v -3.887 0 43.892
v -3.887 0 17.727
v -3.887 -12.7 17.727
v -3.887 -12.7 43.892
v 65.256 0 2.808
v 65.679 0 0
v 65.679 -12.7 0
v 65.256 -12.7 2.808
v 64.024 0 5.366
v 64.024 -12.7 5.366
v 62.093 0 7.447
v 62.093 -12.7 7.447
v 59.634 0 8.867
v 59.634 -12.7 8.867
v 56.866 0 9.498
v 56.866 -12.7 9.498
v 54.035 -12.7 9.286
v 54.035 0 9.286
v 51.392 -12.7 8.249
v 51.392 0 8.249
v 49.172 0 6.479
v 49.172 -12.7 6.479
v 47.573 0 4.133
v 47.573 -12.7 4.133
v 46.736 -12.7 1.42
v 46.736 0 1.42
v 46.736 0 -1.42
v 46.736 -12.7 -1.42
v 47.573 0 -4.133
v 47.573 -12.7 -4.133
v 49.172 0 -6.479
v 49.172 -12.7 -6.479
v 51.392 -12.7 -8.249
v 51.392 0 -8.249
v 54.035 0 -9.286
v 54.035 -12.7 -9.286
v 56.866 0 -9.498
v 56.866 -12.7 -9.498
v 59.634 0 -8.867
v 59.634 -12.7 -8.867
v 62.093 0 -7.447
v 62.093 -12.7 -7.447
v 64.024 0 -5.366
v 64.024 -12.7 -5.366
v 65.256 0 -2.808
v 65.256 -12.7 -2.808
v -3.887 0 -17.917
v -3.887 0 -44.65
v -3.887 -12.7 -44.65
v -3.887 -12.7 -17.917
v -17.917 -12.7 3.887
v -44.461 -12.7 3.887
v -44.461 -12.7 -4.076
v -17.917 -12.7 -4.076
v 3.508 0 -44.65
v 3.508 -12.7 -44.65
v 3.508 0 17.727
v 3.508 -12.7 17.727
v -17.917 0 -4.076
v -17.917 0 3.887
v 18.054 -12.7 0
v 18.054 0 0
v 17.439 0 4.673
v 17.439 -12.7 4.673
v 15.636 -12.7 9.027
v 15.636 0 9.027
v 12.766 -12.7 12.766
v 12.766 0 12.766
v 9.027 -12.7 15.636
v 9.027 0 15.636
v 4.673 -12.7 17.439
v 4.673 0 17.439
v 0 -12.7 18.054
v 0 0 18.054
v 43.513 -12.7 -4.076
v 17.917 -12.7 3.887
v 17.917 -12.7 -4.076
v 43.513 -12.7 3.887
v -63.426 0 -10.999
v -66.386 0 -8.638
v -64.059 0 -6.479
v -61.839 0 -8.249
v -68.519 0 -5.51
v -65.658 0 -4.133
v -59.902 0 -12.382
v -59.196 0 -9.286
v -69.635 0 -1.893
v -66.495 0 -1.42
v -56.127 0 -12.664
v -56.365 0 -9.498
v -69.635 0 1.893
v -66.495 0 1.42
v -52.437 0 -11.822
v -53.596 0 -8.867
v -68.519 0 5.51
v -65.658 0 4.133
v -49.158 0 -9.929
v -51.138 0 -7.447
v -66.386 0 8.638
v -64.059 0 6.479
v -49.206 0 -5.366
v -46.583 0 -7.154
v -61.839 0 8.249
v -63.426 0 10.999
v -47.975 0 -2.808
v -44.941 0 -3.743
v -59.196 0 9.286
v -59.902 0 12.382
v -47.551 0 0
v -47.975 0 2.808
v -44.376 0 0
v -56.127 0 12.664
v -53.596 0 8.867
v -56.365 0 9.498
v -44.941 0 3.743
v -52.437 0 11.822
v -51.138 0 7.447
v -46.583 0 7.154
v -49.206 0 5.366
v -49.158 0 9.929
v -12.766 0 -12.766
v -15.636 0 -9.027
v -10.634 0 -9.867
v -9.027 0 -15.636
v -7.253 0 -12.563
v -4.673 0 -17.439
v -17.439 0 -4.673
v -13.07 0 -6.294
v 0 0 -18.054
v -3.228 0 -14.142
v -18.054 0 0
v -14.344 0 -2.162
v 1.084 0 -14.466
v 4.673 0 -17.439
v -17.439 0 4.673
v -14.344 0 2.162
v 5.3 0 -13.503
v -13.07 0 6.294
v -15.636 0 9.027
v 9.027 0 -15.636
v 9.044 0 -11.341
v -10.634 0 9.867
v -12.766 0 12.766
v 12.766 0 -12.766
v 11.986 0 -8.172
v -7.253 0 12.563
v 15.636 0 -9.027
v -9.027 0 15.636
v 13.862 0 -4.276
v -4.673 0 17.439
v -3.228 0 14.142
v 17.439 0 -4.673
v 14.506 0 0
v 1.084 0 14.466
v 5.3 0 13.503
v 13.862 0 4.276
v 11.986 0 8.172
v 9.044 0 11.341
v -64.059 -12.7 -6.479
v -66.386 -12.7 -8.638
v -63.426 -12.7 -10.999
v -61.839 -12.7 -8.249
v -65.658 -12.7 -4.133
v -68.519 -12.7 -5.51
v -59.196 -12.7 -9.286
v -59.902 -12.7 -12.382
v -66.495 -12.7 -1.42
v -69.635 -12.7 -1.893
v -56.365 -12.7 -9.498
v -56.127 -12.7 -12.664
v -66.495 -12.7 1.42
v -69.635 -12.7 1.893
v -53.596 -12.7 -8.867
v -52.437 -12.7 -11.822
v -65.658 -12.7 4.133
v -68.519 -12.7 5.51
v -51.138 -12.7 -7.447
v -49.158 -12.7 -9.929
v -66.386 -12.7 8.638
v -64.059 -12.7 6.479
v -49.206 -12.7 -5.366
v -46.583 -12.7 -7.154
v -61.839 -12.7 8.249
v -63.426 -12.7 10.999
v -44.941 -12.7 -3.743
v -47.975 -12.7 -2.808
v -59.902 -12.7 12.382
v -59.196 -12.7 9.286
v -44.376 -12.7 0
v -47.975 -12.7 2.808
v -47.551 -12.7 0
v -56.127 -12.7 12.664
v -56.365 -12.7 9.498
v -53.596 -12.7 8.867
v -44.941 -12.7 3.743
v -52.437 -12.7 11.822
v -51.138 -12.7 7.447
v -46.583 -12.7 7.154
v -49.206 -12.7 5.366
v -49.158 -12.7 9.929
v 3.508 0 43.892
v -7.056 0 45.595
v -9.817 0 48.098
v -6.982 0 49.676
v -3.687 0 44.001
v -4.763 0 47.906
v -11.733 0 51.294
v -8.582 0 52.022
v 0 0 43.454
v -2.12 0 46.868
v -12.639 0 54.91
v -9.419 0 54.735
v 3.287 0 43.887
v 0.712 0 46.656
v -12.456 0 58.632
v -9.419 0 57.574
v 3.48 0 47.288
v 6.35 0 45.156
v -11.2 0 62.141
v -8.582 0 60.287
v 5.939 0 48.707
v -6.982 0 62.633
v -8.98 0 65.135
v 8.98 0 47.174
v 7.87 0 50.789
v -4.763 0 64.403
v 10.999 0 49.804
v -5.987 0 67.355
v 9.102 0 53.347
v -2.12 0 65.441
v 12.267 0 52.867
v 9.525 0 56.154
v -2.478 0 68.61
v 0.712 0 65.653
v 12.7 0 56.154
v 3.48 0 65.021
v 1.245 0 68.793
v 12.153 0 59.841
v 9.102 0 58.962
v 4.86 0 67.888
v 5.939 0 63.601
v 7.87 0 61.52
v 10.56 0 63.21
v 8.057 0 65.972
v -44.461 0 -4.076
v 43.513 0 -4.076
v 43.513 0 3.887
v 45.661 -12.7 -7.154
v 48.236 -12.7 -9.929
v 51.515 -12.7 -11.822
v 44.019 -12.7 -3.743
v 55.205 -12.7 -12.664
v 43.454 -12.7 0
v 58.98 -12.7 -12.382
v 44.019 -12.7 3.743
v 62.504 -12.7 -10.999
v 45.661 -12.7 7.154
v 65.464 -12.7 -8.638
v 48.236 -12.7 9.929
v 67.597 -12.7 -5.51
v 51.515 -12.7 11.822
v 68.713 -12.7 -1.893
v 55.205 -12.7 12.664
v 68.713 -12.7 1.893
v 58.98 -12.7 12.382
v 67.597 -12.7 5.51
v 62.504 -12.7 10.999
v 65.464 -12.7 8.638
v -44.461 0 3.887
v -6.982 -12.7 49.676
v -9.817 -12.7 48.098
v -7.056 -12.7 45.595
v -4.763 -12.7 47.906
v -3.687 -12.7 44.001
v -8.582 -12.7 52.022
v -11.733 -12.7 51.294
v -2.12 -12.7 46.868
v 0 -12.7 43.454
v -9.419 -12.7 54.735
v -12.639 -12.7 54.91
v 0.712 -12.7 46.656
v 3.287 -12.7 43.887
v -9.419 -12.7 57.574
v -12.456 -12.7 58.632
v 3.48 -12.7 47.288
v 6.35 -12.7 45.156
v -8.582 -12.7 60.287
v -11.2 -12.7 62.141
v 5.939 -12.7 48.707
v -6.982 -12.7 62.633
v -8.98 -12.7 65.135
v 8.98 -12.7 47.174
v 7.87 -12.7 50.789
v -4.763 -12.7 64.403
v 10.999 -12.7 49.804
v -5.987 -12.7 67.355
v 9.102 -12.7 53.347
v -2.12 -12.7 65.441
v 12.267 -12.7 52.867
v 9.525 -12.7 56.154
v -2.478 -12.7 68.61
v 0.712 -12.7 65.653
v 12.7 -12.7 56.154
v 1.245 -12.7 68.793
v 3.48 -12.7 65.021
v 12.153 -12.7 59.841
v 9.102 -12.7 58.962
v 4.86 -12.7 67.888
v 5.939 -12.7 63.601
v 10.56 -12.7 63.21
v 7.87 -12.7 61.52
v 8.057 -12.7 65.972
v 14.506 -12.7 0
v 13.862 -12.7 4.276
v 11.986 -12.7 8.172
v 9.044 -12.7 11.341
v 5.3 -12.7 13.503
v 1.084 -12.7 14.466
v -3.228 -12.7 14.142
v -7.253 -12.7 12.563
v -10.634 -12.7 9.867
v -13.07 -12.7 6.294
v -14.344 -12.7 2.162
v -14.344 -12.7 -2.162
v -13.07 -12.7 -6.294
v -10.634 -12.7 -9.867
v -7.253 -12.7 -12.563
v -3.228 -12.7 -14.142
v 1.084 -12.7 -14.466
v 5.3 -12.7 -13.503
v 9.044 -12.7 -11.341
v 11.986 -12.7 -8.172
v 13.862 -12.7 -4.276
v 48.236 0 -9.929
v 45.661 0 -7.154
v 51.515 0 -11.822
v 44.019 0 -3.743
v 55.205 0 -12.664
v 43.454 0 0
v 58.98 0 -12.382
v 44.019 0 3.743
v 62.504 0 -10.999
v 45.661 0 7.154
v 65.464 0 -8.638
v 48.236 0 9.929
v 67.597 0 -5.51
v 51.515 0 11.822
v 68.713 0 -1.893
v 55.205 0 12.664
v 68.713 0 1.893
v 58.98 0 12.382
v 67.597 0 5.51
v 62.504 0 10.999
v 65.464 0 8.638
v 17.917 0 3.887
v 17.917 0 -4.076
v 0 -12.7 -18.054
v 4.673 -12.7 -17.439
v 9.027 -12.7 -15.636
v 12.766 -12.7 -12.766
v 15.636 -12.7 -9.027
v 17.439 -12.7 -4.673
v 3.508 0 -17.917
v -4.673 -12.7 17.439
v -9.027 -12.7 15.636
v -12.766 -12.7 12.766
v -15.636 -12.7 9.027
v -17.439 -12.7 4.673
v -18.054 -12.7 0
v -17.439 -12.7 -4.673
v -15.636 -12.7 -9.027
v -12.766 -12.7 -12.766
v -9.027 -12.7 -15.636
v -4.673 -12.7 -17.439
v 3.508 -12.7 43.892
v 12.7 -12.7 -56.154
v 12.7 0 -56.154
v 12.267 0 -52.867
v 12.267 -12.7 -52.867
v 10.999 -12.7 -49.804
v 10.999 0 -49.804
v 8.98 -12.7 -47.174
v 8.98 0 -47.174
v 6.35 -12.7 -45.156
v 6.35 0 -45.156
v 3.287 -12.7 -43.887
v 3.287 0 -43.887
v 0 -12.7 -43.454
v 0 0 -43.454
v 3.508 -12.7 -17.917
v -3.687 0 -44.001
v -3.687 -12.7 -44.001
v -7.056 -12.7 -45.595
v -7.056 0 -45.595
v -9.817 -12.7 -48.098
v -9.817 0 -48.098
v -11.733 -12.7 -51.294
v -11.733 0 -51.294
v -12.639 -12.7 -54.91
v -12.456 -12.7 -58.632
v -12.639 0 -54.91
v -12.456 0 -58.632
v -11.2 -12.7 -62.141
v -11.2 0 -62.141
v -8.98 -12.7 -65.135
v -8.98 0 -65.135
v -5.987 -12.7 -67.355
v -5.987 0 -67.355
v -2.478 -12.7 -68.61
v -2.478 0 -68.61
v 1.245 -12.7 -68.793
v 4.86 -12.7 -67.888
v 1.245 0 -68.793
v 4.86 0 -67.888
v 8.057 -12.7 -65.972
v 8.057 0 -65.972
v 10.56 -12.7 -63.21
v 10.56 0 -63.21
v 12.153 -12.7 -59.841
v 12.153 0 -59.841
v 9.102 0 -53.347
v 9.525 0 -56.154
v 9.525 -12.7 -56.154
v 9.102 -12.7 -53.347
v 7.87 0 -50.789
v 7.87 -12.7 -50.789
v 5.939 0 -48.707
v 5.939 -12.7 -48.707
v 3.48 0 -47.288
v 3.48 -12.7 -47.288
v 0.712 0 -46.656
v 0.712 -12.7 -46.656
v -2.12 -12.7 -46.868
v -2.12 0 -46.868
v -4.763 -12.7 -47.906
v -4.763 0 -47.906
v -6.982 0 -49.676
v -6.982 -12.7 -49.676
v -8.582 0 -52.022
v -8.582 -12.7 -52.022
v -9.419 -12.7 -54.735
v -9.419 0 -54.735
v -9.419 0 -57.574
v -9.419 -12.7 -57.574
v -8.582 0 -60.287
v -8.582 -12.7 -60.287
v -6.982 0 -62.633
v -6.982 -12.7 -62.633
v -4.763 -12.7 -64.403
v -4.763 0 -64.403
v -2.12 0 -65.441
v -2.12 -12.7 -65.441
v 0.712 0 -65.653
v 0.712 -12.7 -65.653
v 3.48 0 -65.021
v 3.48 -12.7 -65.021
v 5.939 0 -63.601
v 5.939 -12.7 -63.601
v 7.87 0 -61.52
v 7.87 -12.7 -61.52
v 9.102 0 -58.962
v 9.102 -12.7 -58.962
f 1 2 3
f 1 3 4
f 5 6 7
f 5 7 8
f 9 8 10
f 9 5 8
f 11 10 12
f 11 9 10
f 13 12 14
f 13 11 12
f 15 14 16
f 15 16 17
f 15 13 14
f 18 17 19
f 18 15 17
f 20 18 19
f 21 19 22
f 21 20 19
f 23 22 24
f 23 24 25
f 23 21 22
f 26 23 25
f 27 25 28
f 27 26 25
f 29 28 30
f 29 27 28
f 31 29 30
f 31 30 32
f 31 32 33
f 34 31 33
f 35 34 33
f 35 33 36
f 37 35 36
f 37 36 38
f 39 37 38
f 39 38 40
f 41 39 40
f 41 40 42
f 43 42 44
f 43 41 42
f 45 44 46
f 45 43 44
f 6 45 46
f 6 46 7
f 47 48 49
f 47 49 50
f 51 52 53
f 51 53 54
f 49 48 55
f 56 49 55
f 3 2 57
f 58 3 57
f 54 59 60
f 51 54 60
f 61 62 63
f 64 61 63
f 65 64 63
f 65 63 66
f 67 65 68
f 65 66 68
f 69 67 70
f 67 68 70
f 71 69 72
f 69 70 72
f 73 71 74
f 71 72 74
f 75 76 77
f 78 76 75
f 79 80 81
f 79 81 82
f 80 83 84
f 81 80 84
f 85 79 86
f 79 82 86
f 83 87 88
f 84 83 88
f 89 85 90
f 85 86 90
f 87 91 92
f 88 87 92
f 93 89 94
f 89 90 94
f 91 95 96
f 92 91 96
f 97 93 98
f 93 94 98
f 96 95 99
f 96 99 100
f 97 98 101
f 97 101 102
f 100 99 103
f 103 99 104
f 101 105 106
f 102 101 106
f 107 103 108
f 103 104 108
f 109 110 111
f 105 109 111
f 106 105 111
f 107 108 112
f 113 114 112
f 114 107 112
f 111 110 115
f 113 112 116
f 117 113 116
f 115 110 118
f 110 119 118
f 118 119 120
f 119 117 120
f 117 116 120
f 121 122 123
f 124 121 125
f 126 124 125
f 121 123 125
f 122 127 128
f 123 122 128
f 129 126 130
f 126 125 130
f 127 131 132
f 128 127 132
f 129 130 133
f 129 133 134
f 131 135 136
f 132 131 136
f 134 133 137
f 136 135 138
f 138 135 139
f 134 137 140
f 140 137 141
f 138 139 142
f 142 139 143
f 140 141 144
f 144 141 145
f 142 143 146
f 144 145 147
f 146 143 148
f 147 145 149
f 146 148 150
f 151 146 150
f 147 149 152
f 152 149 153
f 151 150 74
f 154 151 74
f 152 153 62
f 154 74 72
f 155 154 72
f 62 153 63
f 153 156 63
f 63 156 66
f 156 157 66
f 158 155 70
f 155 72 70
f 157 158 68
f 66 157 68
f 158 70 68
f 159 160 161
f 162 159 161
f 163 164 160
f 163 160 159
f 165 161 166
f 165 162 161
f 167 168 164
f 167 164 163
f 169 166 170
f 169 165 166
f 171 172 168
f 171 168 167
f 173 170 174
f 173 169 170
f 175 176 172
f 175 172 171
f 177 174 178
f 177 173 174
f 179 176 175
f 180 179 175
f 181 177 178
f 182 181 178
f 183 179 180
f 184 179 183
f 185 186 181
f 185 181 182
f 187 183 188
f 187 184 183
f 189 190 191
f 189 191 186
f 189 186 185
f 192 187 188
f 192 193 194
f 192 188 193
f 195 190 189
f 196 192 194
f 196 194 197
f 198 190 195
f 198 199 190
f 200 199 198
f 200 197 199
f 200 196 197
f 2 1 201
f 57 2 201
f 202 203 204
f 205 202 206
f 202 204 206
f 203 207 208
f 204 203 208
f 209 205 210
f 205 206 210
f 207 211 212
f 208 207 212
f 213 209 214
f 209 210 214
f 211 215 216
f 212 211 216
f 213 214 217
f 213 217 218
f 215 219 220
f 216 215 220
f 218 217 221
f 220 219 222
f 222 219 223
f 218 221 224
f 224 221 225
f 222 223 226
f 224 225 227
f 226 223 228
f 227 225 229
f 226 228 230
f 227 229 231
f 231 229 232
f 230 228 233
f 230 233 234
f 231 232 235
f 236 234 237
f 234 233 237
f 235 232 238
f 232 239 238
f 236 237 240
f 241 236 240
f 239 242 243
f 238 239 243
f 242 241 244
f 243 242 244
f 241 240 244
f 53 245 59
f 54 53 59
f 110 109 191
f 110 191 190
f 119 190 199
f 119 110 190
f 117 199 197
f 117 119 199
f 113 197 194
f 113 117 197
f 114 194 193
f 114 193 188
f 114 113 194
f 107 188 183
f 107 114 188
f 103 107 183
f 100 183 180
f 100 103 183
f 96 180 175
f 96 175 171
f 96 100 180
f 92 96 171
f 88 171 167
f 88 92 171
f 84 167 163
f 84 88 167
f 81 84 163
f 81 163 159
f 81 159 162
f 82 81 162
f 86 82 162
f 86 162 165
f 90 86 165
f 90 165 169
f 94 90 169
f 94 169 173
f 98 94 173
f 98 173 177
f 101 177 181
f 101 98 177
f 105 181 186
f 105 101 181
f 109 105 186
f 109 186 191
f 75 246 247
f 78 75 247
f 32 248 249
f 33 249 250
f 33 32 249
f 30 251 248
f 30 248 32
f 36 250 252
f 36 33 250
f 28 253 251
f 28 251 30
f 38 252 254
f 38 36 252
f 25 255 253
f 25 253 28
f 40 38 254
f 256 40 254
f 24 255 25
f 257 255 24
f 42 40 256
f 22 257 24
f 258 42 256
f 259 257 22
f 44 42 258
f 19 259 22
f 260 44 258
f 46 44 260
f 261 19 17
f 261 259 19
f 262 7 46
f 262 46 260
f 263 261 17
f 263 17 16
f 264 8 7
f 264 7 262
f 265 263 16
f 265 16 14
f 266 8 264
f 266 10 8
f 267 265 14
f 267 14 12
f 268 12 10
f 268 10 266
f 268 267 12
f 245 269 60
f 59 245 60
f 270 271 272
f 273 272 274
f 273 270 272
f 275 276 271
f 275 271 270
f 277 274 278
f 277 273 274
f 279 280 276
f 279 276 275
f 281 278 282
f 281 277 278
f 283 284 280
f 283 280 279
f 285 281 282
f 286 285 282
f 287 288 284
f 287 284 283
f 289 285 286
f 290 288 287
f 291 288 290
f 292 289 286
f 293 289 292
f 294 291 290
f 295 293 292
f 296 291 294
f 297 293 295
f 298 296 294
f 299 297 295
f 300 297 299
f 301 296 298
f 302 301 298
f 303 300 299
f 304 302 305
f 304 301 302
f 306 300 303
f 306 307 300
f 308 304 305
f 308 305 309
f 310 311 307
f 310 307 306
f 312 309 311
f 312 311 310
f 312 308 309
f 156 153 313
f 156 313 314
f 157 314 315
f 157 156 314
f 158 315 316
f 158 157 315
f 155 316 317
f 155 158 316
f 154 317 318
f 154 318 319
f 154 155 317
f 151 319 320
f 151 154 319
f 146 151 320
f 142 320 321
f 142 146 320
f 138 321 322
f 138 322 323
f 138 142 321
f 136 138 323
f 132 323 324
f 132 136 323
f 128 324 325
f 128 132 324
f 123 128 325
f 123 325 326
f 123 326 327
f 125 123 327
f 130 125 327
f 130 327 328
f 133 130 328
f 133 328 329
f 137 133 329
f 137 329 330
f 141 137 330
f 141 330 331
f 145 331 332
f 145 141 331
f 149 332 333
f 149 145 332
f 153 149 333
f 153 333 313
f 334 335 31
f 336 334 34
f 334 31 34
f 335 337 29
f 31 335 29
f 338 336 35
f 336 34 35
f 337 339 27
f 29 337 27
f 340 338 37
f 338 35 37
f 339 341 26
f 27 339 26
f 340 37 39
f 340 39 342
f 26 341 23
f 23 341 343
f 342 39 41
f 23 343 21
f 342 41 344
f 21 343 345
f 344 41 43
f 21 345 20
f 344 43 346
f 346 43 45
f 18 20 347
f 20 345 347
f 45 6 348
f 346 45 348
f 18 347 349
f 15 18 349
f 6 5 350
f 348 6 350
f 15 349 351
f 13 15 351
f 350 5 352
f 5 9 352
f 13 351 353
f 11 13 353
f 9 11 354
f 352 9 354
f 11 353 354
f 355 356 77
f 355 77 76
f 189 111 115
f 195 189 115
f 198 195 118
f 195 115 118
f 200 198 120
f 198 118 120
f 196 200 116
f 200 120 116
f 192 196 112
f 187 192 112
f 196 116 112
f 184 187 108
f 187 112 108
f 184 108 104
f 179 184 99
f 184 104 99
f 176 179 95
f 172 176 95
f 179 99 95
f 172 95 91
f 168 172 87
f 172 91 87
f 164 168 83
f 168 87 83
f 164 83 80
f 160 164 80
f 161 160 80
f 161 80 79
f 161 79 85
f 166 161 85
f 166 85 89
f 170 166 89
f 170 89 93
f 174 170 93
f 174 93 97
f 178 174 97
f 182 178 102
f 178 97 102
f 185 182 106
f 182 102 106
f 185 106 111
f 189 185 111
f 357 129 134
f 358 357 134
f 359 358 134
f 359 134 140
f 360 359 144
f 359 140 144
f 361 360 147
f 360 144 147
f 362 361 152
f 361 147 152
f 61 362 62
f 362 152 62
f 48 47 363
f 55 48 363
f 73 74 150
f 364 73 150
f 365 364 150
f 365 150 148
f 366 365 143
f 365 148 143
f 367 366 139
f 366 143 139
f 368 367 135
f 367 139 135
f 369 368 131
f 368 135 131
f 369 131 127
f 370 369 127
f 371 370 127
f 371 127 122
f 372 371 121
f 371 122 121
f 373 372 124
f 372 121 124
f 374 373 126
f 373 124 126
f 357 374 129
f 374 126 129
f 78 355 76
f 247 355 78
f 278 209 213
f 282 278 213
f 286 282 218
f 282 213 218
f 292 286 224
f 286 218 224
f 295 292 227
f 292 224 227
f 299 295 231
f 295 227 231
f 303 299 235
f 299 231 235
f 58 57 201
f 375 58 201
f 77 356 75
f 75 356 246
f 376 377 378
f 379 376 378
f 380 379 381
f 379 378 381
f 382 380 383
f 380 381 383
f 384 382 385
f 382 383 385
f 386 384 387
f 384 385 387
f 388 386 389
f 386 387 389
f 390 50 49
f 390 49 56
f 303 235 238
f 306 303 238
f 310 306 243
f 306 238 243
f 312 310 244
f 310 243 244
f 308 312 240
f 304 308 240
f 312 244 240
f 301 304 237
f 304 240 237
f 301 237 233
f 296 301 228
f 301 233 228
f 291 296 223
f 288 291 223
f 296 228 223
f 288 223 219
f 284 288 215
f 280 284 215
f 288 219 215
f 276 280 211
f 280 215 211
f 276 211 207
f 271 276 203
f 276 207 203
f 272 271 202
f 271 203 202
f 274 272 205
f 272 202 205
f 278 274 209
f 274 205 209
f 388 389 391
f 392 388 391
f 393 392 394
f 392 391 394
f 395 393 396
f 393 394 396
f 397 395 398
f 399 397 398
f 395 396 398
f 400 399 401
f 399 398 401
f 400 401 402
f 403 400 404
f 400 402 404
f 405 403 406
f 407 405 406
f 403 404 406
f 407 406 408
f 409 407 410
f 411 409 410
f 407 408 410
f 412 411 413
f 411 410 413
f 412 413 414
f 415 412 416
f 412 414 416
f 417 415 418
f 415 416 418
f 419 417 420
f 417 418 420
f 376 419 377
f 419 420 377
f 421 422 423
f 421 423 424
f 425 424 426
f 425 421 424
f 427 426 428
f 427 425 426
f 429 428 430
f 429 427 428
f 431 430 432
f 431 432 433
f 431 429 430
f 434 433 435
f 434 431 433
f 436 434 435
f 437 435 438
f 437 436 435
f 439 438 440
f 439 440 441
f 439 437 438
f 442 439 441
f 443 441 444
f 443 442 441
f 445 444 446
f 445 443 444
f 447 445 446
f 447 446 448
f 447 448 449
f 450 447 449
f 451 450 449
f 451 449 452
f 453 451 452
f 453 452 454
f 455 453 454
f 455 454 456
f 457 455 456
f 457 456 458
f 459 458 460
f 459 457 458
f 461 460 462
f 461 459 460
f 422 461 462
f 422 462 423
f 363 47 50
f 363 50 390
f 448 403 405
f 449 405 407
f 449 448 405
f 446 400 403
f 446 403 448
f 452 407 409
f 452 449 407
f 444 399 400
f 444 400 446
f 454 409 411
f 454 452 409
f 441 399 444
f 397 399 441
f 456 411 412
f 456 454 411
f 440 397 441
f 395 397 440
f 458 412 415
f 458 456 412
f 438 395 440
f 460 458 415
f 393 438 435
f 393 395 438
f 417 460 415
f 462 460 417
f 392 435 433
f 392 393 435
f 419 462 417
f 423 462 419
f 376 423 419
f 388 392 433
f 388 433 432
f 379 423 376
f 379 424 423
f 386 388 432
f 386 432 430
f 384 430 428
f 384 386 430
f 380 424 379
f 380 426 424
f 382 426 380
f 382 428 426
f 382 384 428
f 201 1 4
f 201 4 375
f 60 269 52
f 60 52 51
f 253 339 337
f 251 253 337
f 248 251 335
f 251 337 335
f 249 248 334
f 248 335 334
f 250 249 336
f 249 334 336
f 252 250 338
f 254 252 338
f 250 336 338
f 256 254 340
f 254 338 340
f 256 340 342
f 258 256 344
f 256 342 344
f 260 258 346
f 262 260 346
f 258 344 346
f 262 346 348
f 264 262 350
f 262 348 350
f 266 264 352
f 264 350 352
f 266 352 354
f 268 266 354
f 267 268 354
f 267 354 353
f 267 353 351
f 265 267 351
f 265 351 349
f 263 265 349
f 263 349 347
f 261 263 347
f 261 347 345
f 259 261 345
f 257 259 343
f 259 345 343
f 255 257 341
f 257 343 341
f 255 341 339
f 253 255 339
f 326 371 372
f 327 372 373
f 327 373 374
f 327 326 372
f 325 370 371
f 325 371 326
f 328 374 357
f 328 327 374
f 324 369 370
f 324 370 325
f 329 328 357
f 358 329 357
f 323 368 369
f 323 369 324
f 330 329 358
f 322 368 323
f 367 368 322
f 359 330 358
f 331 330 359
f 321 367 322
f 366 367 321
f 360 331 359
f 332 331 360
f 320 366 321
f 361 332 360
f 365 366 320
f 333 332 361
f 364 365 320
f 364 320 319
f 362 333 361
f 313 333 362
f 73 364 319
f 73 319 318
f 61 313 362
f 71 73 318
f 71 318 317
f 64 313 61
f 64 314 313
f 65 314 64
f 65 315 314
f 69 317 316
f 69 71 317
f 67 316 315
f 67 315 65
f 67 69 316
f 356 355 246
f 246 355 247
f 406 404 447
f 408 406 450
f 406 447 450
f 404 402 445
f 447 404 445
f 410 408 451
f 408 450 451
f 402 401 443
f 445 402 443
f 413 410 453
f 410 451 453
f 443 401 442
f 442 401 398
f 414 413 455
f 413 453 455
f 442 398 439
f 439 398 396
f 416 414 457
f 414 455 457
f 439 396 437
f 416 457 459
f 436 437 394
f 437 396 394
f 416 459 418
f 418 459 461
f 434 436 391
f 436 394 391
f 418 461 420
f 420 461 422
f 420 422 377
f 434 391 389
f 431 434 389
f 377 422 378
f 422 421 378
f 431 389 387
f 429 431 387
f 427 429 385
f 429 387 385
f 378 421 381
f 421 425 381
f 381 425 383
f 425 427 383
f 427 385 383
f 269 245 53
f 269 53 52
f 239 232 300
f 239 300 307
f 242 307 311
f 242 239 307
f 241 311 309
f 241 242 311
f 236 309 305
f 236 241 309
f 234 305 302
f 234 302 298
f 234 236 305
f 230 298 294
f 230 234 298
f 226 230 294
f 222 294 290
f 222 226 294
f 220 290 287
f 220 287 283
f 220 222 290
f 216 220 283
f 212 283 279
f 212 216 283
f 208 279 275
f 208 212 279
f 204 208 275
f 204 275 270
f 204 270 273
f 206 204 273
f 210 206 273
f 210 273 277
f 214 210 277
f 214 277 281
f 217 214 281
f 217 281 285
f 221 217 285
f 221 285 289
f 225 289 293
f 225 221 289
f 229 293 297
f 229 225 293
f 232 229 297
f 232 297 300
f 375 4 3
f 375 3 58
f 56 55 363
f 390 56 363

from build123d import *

# Parameters (mm, degrees)
F0_R     = 14.5061220646
F1_DEPTH = 12.7
F0_R_2   = 9.525
F0_R_3   = 12.7
F2_W     = 7.3942888994
F2_H     = 26.1644087732
F3_DEPTH = 12.7
F2_W_2   = 26.5436004847
F2_H_2   = 7.9630806576
F2_H_3   = 26.7332028598
F2_W_3   = 25.5956184119


# Not quite as in the source:
# - a feature of the source that left no trace in its solid (it failed there, or was rolled back) is left out


with BuildPart() as f1:
    # F0 (on Front) → F1 (new body)
    with BuildSketch(Plane.XZ):
        with BuildLine():
            ThreePointArc((0, -18.0544013501), (12.7663896249, -12.7663896249), (18.0544013501, 0))
            ThreePointArc((18.0544013501, 0), (12.7663896249, 12.7663896249), (0, 18.0544013501))
            ThreePointArc((0, 18.0544013501), (-12.7663896249, 12.7663896249), (-18.0544013501, 0))
            ThreePointArc((-18.0544013501, 0), (-12.7663896249, -12.7663896249), (0, -18.0544013501))
        make_face()
        Circle(F0_R, mode=Mode.SUBTRACT)
    extrude(amount=F1_DEPTH)


with BuildPart() as f1b:
    # F0 (on Front) → F1, piece 2 (new body)
    with BuildSketch(Plane.XZ):
        with BuildLine():
            ThreePointArc((12.7, -56.1544013501), (8.9802561211, -47.1741452291), (0, -43.4544013501))
            ThreePointArc((0, -43.4544013501), (-8.9802561211, -65.1346574712), (12.7, -56.1544013501))
        make_face()
        with Locations((0, -56.1544013501)):
            Circle(F0_R_2, mode=Mode.SUBTRACT)
    extrude(amount=F1_DEPTH)


with BuildPart() as f1c:
    # F0 (on Front) → F1, piece 3 (new body)
    with BuildSketch(Plane.XZ):
        with BuildLine():
            ThreePointArc((12.7, 56.1544013501), (-8.9802561211, 65.1346574712), (0, 43.4544013501))
            ThreePointArc((0, 43.4544013501), (8.9802561211, 47.1741452291), (12.7, 56.1544013501))
        make_face()
        with Locations((0, 56.1544013501)):
            Circle(F0_R_2, mode=Mode.SUBTRACT)
    extrude(amount=F1_DEPTH)


with BuildPart() as f1d:
    # F0 (on Front) → F1, piece 4 (new body)
    with BuildSketch(Plane.XZ):
        with BuildLine():
            ThreePointArc((68.8544013501, 0), (56.1544013501, 12.7), (43.4544013501, 0))
            ThreePointArc((43.4544013501, 0), (56.1544013501, -12.7), (68.8544013501, 0))
        make_face()
        with Locations((56.1544013501, 0)):
            Circle(F0_R_2, mode=Mode.SUBTRACT)
    extrude(amount=F1_DEPTH)


with BuildPart() as f1e:
    # F0 (on Front) → F1, piece 5 (new body)
    with BuildSketch(Plane.XZ):
        with Locations((-57.0763641485, 0)):
            Circle(F0_R_3)
        with Locations((-57.0763641485, 0)):
            Circle(F0_R_2, mode=Mode.SUBTRACT)
    extrude(amount=F1_DEPTH)


with BuildPart() as f3:
    # F2 (on Front) → F3 (new body)
    with BuildSketch(Plane.XZ):
        with Locations((-0.1895966707, 30.8095384389)):
            Rectangle(F2_W, F2_H)
    extrude(amount=F3_DEPTH)


with BuildPart() as f3b:
    # F2 (on Front) → F3, piece 2 (new body)
    with BuildSketch(Plane.XZ):
        with Locations((-31.1887310818, -0.09479851)):
            Rectangle(F2_W_2, F2_H_2)
    extrude(amount=F3_DEPTH)


with BuildPart() as f3c:
    # F2 (on Front) → F3, piece 3 (new body)
    with BuildSketch(Plane.XZ):
        with Locations((-0.1895966707, -31.2835322693)):
            Rectangle(F2_W, F2_H_3)
    extrude(amount=F3_DEPTH)


with BuildPart() as f3d:
    # F2 (on Front) → F3, piece 4 (new body)
    with BuildSketch(Plane.XZ):
        with Locations((30.7147400454, -0.09479851)):
            Rectangle(F2_W_3, F2_H_2)
    extrude(amount=F3_DEPTH)


solid = Compound([f1.part, f1b.part, f1c.part, f1d.part, f1e.part, f3.part, f3b.part, f3c.part, f3d.part])
